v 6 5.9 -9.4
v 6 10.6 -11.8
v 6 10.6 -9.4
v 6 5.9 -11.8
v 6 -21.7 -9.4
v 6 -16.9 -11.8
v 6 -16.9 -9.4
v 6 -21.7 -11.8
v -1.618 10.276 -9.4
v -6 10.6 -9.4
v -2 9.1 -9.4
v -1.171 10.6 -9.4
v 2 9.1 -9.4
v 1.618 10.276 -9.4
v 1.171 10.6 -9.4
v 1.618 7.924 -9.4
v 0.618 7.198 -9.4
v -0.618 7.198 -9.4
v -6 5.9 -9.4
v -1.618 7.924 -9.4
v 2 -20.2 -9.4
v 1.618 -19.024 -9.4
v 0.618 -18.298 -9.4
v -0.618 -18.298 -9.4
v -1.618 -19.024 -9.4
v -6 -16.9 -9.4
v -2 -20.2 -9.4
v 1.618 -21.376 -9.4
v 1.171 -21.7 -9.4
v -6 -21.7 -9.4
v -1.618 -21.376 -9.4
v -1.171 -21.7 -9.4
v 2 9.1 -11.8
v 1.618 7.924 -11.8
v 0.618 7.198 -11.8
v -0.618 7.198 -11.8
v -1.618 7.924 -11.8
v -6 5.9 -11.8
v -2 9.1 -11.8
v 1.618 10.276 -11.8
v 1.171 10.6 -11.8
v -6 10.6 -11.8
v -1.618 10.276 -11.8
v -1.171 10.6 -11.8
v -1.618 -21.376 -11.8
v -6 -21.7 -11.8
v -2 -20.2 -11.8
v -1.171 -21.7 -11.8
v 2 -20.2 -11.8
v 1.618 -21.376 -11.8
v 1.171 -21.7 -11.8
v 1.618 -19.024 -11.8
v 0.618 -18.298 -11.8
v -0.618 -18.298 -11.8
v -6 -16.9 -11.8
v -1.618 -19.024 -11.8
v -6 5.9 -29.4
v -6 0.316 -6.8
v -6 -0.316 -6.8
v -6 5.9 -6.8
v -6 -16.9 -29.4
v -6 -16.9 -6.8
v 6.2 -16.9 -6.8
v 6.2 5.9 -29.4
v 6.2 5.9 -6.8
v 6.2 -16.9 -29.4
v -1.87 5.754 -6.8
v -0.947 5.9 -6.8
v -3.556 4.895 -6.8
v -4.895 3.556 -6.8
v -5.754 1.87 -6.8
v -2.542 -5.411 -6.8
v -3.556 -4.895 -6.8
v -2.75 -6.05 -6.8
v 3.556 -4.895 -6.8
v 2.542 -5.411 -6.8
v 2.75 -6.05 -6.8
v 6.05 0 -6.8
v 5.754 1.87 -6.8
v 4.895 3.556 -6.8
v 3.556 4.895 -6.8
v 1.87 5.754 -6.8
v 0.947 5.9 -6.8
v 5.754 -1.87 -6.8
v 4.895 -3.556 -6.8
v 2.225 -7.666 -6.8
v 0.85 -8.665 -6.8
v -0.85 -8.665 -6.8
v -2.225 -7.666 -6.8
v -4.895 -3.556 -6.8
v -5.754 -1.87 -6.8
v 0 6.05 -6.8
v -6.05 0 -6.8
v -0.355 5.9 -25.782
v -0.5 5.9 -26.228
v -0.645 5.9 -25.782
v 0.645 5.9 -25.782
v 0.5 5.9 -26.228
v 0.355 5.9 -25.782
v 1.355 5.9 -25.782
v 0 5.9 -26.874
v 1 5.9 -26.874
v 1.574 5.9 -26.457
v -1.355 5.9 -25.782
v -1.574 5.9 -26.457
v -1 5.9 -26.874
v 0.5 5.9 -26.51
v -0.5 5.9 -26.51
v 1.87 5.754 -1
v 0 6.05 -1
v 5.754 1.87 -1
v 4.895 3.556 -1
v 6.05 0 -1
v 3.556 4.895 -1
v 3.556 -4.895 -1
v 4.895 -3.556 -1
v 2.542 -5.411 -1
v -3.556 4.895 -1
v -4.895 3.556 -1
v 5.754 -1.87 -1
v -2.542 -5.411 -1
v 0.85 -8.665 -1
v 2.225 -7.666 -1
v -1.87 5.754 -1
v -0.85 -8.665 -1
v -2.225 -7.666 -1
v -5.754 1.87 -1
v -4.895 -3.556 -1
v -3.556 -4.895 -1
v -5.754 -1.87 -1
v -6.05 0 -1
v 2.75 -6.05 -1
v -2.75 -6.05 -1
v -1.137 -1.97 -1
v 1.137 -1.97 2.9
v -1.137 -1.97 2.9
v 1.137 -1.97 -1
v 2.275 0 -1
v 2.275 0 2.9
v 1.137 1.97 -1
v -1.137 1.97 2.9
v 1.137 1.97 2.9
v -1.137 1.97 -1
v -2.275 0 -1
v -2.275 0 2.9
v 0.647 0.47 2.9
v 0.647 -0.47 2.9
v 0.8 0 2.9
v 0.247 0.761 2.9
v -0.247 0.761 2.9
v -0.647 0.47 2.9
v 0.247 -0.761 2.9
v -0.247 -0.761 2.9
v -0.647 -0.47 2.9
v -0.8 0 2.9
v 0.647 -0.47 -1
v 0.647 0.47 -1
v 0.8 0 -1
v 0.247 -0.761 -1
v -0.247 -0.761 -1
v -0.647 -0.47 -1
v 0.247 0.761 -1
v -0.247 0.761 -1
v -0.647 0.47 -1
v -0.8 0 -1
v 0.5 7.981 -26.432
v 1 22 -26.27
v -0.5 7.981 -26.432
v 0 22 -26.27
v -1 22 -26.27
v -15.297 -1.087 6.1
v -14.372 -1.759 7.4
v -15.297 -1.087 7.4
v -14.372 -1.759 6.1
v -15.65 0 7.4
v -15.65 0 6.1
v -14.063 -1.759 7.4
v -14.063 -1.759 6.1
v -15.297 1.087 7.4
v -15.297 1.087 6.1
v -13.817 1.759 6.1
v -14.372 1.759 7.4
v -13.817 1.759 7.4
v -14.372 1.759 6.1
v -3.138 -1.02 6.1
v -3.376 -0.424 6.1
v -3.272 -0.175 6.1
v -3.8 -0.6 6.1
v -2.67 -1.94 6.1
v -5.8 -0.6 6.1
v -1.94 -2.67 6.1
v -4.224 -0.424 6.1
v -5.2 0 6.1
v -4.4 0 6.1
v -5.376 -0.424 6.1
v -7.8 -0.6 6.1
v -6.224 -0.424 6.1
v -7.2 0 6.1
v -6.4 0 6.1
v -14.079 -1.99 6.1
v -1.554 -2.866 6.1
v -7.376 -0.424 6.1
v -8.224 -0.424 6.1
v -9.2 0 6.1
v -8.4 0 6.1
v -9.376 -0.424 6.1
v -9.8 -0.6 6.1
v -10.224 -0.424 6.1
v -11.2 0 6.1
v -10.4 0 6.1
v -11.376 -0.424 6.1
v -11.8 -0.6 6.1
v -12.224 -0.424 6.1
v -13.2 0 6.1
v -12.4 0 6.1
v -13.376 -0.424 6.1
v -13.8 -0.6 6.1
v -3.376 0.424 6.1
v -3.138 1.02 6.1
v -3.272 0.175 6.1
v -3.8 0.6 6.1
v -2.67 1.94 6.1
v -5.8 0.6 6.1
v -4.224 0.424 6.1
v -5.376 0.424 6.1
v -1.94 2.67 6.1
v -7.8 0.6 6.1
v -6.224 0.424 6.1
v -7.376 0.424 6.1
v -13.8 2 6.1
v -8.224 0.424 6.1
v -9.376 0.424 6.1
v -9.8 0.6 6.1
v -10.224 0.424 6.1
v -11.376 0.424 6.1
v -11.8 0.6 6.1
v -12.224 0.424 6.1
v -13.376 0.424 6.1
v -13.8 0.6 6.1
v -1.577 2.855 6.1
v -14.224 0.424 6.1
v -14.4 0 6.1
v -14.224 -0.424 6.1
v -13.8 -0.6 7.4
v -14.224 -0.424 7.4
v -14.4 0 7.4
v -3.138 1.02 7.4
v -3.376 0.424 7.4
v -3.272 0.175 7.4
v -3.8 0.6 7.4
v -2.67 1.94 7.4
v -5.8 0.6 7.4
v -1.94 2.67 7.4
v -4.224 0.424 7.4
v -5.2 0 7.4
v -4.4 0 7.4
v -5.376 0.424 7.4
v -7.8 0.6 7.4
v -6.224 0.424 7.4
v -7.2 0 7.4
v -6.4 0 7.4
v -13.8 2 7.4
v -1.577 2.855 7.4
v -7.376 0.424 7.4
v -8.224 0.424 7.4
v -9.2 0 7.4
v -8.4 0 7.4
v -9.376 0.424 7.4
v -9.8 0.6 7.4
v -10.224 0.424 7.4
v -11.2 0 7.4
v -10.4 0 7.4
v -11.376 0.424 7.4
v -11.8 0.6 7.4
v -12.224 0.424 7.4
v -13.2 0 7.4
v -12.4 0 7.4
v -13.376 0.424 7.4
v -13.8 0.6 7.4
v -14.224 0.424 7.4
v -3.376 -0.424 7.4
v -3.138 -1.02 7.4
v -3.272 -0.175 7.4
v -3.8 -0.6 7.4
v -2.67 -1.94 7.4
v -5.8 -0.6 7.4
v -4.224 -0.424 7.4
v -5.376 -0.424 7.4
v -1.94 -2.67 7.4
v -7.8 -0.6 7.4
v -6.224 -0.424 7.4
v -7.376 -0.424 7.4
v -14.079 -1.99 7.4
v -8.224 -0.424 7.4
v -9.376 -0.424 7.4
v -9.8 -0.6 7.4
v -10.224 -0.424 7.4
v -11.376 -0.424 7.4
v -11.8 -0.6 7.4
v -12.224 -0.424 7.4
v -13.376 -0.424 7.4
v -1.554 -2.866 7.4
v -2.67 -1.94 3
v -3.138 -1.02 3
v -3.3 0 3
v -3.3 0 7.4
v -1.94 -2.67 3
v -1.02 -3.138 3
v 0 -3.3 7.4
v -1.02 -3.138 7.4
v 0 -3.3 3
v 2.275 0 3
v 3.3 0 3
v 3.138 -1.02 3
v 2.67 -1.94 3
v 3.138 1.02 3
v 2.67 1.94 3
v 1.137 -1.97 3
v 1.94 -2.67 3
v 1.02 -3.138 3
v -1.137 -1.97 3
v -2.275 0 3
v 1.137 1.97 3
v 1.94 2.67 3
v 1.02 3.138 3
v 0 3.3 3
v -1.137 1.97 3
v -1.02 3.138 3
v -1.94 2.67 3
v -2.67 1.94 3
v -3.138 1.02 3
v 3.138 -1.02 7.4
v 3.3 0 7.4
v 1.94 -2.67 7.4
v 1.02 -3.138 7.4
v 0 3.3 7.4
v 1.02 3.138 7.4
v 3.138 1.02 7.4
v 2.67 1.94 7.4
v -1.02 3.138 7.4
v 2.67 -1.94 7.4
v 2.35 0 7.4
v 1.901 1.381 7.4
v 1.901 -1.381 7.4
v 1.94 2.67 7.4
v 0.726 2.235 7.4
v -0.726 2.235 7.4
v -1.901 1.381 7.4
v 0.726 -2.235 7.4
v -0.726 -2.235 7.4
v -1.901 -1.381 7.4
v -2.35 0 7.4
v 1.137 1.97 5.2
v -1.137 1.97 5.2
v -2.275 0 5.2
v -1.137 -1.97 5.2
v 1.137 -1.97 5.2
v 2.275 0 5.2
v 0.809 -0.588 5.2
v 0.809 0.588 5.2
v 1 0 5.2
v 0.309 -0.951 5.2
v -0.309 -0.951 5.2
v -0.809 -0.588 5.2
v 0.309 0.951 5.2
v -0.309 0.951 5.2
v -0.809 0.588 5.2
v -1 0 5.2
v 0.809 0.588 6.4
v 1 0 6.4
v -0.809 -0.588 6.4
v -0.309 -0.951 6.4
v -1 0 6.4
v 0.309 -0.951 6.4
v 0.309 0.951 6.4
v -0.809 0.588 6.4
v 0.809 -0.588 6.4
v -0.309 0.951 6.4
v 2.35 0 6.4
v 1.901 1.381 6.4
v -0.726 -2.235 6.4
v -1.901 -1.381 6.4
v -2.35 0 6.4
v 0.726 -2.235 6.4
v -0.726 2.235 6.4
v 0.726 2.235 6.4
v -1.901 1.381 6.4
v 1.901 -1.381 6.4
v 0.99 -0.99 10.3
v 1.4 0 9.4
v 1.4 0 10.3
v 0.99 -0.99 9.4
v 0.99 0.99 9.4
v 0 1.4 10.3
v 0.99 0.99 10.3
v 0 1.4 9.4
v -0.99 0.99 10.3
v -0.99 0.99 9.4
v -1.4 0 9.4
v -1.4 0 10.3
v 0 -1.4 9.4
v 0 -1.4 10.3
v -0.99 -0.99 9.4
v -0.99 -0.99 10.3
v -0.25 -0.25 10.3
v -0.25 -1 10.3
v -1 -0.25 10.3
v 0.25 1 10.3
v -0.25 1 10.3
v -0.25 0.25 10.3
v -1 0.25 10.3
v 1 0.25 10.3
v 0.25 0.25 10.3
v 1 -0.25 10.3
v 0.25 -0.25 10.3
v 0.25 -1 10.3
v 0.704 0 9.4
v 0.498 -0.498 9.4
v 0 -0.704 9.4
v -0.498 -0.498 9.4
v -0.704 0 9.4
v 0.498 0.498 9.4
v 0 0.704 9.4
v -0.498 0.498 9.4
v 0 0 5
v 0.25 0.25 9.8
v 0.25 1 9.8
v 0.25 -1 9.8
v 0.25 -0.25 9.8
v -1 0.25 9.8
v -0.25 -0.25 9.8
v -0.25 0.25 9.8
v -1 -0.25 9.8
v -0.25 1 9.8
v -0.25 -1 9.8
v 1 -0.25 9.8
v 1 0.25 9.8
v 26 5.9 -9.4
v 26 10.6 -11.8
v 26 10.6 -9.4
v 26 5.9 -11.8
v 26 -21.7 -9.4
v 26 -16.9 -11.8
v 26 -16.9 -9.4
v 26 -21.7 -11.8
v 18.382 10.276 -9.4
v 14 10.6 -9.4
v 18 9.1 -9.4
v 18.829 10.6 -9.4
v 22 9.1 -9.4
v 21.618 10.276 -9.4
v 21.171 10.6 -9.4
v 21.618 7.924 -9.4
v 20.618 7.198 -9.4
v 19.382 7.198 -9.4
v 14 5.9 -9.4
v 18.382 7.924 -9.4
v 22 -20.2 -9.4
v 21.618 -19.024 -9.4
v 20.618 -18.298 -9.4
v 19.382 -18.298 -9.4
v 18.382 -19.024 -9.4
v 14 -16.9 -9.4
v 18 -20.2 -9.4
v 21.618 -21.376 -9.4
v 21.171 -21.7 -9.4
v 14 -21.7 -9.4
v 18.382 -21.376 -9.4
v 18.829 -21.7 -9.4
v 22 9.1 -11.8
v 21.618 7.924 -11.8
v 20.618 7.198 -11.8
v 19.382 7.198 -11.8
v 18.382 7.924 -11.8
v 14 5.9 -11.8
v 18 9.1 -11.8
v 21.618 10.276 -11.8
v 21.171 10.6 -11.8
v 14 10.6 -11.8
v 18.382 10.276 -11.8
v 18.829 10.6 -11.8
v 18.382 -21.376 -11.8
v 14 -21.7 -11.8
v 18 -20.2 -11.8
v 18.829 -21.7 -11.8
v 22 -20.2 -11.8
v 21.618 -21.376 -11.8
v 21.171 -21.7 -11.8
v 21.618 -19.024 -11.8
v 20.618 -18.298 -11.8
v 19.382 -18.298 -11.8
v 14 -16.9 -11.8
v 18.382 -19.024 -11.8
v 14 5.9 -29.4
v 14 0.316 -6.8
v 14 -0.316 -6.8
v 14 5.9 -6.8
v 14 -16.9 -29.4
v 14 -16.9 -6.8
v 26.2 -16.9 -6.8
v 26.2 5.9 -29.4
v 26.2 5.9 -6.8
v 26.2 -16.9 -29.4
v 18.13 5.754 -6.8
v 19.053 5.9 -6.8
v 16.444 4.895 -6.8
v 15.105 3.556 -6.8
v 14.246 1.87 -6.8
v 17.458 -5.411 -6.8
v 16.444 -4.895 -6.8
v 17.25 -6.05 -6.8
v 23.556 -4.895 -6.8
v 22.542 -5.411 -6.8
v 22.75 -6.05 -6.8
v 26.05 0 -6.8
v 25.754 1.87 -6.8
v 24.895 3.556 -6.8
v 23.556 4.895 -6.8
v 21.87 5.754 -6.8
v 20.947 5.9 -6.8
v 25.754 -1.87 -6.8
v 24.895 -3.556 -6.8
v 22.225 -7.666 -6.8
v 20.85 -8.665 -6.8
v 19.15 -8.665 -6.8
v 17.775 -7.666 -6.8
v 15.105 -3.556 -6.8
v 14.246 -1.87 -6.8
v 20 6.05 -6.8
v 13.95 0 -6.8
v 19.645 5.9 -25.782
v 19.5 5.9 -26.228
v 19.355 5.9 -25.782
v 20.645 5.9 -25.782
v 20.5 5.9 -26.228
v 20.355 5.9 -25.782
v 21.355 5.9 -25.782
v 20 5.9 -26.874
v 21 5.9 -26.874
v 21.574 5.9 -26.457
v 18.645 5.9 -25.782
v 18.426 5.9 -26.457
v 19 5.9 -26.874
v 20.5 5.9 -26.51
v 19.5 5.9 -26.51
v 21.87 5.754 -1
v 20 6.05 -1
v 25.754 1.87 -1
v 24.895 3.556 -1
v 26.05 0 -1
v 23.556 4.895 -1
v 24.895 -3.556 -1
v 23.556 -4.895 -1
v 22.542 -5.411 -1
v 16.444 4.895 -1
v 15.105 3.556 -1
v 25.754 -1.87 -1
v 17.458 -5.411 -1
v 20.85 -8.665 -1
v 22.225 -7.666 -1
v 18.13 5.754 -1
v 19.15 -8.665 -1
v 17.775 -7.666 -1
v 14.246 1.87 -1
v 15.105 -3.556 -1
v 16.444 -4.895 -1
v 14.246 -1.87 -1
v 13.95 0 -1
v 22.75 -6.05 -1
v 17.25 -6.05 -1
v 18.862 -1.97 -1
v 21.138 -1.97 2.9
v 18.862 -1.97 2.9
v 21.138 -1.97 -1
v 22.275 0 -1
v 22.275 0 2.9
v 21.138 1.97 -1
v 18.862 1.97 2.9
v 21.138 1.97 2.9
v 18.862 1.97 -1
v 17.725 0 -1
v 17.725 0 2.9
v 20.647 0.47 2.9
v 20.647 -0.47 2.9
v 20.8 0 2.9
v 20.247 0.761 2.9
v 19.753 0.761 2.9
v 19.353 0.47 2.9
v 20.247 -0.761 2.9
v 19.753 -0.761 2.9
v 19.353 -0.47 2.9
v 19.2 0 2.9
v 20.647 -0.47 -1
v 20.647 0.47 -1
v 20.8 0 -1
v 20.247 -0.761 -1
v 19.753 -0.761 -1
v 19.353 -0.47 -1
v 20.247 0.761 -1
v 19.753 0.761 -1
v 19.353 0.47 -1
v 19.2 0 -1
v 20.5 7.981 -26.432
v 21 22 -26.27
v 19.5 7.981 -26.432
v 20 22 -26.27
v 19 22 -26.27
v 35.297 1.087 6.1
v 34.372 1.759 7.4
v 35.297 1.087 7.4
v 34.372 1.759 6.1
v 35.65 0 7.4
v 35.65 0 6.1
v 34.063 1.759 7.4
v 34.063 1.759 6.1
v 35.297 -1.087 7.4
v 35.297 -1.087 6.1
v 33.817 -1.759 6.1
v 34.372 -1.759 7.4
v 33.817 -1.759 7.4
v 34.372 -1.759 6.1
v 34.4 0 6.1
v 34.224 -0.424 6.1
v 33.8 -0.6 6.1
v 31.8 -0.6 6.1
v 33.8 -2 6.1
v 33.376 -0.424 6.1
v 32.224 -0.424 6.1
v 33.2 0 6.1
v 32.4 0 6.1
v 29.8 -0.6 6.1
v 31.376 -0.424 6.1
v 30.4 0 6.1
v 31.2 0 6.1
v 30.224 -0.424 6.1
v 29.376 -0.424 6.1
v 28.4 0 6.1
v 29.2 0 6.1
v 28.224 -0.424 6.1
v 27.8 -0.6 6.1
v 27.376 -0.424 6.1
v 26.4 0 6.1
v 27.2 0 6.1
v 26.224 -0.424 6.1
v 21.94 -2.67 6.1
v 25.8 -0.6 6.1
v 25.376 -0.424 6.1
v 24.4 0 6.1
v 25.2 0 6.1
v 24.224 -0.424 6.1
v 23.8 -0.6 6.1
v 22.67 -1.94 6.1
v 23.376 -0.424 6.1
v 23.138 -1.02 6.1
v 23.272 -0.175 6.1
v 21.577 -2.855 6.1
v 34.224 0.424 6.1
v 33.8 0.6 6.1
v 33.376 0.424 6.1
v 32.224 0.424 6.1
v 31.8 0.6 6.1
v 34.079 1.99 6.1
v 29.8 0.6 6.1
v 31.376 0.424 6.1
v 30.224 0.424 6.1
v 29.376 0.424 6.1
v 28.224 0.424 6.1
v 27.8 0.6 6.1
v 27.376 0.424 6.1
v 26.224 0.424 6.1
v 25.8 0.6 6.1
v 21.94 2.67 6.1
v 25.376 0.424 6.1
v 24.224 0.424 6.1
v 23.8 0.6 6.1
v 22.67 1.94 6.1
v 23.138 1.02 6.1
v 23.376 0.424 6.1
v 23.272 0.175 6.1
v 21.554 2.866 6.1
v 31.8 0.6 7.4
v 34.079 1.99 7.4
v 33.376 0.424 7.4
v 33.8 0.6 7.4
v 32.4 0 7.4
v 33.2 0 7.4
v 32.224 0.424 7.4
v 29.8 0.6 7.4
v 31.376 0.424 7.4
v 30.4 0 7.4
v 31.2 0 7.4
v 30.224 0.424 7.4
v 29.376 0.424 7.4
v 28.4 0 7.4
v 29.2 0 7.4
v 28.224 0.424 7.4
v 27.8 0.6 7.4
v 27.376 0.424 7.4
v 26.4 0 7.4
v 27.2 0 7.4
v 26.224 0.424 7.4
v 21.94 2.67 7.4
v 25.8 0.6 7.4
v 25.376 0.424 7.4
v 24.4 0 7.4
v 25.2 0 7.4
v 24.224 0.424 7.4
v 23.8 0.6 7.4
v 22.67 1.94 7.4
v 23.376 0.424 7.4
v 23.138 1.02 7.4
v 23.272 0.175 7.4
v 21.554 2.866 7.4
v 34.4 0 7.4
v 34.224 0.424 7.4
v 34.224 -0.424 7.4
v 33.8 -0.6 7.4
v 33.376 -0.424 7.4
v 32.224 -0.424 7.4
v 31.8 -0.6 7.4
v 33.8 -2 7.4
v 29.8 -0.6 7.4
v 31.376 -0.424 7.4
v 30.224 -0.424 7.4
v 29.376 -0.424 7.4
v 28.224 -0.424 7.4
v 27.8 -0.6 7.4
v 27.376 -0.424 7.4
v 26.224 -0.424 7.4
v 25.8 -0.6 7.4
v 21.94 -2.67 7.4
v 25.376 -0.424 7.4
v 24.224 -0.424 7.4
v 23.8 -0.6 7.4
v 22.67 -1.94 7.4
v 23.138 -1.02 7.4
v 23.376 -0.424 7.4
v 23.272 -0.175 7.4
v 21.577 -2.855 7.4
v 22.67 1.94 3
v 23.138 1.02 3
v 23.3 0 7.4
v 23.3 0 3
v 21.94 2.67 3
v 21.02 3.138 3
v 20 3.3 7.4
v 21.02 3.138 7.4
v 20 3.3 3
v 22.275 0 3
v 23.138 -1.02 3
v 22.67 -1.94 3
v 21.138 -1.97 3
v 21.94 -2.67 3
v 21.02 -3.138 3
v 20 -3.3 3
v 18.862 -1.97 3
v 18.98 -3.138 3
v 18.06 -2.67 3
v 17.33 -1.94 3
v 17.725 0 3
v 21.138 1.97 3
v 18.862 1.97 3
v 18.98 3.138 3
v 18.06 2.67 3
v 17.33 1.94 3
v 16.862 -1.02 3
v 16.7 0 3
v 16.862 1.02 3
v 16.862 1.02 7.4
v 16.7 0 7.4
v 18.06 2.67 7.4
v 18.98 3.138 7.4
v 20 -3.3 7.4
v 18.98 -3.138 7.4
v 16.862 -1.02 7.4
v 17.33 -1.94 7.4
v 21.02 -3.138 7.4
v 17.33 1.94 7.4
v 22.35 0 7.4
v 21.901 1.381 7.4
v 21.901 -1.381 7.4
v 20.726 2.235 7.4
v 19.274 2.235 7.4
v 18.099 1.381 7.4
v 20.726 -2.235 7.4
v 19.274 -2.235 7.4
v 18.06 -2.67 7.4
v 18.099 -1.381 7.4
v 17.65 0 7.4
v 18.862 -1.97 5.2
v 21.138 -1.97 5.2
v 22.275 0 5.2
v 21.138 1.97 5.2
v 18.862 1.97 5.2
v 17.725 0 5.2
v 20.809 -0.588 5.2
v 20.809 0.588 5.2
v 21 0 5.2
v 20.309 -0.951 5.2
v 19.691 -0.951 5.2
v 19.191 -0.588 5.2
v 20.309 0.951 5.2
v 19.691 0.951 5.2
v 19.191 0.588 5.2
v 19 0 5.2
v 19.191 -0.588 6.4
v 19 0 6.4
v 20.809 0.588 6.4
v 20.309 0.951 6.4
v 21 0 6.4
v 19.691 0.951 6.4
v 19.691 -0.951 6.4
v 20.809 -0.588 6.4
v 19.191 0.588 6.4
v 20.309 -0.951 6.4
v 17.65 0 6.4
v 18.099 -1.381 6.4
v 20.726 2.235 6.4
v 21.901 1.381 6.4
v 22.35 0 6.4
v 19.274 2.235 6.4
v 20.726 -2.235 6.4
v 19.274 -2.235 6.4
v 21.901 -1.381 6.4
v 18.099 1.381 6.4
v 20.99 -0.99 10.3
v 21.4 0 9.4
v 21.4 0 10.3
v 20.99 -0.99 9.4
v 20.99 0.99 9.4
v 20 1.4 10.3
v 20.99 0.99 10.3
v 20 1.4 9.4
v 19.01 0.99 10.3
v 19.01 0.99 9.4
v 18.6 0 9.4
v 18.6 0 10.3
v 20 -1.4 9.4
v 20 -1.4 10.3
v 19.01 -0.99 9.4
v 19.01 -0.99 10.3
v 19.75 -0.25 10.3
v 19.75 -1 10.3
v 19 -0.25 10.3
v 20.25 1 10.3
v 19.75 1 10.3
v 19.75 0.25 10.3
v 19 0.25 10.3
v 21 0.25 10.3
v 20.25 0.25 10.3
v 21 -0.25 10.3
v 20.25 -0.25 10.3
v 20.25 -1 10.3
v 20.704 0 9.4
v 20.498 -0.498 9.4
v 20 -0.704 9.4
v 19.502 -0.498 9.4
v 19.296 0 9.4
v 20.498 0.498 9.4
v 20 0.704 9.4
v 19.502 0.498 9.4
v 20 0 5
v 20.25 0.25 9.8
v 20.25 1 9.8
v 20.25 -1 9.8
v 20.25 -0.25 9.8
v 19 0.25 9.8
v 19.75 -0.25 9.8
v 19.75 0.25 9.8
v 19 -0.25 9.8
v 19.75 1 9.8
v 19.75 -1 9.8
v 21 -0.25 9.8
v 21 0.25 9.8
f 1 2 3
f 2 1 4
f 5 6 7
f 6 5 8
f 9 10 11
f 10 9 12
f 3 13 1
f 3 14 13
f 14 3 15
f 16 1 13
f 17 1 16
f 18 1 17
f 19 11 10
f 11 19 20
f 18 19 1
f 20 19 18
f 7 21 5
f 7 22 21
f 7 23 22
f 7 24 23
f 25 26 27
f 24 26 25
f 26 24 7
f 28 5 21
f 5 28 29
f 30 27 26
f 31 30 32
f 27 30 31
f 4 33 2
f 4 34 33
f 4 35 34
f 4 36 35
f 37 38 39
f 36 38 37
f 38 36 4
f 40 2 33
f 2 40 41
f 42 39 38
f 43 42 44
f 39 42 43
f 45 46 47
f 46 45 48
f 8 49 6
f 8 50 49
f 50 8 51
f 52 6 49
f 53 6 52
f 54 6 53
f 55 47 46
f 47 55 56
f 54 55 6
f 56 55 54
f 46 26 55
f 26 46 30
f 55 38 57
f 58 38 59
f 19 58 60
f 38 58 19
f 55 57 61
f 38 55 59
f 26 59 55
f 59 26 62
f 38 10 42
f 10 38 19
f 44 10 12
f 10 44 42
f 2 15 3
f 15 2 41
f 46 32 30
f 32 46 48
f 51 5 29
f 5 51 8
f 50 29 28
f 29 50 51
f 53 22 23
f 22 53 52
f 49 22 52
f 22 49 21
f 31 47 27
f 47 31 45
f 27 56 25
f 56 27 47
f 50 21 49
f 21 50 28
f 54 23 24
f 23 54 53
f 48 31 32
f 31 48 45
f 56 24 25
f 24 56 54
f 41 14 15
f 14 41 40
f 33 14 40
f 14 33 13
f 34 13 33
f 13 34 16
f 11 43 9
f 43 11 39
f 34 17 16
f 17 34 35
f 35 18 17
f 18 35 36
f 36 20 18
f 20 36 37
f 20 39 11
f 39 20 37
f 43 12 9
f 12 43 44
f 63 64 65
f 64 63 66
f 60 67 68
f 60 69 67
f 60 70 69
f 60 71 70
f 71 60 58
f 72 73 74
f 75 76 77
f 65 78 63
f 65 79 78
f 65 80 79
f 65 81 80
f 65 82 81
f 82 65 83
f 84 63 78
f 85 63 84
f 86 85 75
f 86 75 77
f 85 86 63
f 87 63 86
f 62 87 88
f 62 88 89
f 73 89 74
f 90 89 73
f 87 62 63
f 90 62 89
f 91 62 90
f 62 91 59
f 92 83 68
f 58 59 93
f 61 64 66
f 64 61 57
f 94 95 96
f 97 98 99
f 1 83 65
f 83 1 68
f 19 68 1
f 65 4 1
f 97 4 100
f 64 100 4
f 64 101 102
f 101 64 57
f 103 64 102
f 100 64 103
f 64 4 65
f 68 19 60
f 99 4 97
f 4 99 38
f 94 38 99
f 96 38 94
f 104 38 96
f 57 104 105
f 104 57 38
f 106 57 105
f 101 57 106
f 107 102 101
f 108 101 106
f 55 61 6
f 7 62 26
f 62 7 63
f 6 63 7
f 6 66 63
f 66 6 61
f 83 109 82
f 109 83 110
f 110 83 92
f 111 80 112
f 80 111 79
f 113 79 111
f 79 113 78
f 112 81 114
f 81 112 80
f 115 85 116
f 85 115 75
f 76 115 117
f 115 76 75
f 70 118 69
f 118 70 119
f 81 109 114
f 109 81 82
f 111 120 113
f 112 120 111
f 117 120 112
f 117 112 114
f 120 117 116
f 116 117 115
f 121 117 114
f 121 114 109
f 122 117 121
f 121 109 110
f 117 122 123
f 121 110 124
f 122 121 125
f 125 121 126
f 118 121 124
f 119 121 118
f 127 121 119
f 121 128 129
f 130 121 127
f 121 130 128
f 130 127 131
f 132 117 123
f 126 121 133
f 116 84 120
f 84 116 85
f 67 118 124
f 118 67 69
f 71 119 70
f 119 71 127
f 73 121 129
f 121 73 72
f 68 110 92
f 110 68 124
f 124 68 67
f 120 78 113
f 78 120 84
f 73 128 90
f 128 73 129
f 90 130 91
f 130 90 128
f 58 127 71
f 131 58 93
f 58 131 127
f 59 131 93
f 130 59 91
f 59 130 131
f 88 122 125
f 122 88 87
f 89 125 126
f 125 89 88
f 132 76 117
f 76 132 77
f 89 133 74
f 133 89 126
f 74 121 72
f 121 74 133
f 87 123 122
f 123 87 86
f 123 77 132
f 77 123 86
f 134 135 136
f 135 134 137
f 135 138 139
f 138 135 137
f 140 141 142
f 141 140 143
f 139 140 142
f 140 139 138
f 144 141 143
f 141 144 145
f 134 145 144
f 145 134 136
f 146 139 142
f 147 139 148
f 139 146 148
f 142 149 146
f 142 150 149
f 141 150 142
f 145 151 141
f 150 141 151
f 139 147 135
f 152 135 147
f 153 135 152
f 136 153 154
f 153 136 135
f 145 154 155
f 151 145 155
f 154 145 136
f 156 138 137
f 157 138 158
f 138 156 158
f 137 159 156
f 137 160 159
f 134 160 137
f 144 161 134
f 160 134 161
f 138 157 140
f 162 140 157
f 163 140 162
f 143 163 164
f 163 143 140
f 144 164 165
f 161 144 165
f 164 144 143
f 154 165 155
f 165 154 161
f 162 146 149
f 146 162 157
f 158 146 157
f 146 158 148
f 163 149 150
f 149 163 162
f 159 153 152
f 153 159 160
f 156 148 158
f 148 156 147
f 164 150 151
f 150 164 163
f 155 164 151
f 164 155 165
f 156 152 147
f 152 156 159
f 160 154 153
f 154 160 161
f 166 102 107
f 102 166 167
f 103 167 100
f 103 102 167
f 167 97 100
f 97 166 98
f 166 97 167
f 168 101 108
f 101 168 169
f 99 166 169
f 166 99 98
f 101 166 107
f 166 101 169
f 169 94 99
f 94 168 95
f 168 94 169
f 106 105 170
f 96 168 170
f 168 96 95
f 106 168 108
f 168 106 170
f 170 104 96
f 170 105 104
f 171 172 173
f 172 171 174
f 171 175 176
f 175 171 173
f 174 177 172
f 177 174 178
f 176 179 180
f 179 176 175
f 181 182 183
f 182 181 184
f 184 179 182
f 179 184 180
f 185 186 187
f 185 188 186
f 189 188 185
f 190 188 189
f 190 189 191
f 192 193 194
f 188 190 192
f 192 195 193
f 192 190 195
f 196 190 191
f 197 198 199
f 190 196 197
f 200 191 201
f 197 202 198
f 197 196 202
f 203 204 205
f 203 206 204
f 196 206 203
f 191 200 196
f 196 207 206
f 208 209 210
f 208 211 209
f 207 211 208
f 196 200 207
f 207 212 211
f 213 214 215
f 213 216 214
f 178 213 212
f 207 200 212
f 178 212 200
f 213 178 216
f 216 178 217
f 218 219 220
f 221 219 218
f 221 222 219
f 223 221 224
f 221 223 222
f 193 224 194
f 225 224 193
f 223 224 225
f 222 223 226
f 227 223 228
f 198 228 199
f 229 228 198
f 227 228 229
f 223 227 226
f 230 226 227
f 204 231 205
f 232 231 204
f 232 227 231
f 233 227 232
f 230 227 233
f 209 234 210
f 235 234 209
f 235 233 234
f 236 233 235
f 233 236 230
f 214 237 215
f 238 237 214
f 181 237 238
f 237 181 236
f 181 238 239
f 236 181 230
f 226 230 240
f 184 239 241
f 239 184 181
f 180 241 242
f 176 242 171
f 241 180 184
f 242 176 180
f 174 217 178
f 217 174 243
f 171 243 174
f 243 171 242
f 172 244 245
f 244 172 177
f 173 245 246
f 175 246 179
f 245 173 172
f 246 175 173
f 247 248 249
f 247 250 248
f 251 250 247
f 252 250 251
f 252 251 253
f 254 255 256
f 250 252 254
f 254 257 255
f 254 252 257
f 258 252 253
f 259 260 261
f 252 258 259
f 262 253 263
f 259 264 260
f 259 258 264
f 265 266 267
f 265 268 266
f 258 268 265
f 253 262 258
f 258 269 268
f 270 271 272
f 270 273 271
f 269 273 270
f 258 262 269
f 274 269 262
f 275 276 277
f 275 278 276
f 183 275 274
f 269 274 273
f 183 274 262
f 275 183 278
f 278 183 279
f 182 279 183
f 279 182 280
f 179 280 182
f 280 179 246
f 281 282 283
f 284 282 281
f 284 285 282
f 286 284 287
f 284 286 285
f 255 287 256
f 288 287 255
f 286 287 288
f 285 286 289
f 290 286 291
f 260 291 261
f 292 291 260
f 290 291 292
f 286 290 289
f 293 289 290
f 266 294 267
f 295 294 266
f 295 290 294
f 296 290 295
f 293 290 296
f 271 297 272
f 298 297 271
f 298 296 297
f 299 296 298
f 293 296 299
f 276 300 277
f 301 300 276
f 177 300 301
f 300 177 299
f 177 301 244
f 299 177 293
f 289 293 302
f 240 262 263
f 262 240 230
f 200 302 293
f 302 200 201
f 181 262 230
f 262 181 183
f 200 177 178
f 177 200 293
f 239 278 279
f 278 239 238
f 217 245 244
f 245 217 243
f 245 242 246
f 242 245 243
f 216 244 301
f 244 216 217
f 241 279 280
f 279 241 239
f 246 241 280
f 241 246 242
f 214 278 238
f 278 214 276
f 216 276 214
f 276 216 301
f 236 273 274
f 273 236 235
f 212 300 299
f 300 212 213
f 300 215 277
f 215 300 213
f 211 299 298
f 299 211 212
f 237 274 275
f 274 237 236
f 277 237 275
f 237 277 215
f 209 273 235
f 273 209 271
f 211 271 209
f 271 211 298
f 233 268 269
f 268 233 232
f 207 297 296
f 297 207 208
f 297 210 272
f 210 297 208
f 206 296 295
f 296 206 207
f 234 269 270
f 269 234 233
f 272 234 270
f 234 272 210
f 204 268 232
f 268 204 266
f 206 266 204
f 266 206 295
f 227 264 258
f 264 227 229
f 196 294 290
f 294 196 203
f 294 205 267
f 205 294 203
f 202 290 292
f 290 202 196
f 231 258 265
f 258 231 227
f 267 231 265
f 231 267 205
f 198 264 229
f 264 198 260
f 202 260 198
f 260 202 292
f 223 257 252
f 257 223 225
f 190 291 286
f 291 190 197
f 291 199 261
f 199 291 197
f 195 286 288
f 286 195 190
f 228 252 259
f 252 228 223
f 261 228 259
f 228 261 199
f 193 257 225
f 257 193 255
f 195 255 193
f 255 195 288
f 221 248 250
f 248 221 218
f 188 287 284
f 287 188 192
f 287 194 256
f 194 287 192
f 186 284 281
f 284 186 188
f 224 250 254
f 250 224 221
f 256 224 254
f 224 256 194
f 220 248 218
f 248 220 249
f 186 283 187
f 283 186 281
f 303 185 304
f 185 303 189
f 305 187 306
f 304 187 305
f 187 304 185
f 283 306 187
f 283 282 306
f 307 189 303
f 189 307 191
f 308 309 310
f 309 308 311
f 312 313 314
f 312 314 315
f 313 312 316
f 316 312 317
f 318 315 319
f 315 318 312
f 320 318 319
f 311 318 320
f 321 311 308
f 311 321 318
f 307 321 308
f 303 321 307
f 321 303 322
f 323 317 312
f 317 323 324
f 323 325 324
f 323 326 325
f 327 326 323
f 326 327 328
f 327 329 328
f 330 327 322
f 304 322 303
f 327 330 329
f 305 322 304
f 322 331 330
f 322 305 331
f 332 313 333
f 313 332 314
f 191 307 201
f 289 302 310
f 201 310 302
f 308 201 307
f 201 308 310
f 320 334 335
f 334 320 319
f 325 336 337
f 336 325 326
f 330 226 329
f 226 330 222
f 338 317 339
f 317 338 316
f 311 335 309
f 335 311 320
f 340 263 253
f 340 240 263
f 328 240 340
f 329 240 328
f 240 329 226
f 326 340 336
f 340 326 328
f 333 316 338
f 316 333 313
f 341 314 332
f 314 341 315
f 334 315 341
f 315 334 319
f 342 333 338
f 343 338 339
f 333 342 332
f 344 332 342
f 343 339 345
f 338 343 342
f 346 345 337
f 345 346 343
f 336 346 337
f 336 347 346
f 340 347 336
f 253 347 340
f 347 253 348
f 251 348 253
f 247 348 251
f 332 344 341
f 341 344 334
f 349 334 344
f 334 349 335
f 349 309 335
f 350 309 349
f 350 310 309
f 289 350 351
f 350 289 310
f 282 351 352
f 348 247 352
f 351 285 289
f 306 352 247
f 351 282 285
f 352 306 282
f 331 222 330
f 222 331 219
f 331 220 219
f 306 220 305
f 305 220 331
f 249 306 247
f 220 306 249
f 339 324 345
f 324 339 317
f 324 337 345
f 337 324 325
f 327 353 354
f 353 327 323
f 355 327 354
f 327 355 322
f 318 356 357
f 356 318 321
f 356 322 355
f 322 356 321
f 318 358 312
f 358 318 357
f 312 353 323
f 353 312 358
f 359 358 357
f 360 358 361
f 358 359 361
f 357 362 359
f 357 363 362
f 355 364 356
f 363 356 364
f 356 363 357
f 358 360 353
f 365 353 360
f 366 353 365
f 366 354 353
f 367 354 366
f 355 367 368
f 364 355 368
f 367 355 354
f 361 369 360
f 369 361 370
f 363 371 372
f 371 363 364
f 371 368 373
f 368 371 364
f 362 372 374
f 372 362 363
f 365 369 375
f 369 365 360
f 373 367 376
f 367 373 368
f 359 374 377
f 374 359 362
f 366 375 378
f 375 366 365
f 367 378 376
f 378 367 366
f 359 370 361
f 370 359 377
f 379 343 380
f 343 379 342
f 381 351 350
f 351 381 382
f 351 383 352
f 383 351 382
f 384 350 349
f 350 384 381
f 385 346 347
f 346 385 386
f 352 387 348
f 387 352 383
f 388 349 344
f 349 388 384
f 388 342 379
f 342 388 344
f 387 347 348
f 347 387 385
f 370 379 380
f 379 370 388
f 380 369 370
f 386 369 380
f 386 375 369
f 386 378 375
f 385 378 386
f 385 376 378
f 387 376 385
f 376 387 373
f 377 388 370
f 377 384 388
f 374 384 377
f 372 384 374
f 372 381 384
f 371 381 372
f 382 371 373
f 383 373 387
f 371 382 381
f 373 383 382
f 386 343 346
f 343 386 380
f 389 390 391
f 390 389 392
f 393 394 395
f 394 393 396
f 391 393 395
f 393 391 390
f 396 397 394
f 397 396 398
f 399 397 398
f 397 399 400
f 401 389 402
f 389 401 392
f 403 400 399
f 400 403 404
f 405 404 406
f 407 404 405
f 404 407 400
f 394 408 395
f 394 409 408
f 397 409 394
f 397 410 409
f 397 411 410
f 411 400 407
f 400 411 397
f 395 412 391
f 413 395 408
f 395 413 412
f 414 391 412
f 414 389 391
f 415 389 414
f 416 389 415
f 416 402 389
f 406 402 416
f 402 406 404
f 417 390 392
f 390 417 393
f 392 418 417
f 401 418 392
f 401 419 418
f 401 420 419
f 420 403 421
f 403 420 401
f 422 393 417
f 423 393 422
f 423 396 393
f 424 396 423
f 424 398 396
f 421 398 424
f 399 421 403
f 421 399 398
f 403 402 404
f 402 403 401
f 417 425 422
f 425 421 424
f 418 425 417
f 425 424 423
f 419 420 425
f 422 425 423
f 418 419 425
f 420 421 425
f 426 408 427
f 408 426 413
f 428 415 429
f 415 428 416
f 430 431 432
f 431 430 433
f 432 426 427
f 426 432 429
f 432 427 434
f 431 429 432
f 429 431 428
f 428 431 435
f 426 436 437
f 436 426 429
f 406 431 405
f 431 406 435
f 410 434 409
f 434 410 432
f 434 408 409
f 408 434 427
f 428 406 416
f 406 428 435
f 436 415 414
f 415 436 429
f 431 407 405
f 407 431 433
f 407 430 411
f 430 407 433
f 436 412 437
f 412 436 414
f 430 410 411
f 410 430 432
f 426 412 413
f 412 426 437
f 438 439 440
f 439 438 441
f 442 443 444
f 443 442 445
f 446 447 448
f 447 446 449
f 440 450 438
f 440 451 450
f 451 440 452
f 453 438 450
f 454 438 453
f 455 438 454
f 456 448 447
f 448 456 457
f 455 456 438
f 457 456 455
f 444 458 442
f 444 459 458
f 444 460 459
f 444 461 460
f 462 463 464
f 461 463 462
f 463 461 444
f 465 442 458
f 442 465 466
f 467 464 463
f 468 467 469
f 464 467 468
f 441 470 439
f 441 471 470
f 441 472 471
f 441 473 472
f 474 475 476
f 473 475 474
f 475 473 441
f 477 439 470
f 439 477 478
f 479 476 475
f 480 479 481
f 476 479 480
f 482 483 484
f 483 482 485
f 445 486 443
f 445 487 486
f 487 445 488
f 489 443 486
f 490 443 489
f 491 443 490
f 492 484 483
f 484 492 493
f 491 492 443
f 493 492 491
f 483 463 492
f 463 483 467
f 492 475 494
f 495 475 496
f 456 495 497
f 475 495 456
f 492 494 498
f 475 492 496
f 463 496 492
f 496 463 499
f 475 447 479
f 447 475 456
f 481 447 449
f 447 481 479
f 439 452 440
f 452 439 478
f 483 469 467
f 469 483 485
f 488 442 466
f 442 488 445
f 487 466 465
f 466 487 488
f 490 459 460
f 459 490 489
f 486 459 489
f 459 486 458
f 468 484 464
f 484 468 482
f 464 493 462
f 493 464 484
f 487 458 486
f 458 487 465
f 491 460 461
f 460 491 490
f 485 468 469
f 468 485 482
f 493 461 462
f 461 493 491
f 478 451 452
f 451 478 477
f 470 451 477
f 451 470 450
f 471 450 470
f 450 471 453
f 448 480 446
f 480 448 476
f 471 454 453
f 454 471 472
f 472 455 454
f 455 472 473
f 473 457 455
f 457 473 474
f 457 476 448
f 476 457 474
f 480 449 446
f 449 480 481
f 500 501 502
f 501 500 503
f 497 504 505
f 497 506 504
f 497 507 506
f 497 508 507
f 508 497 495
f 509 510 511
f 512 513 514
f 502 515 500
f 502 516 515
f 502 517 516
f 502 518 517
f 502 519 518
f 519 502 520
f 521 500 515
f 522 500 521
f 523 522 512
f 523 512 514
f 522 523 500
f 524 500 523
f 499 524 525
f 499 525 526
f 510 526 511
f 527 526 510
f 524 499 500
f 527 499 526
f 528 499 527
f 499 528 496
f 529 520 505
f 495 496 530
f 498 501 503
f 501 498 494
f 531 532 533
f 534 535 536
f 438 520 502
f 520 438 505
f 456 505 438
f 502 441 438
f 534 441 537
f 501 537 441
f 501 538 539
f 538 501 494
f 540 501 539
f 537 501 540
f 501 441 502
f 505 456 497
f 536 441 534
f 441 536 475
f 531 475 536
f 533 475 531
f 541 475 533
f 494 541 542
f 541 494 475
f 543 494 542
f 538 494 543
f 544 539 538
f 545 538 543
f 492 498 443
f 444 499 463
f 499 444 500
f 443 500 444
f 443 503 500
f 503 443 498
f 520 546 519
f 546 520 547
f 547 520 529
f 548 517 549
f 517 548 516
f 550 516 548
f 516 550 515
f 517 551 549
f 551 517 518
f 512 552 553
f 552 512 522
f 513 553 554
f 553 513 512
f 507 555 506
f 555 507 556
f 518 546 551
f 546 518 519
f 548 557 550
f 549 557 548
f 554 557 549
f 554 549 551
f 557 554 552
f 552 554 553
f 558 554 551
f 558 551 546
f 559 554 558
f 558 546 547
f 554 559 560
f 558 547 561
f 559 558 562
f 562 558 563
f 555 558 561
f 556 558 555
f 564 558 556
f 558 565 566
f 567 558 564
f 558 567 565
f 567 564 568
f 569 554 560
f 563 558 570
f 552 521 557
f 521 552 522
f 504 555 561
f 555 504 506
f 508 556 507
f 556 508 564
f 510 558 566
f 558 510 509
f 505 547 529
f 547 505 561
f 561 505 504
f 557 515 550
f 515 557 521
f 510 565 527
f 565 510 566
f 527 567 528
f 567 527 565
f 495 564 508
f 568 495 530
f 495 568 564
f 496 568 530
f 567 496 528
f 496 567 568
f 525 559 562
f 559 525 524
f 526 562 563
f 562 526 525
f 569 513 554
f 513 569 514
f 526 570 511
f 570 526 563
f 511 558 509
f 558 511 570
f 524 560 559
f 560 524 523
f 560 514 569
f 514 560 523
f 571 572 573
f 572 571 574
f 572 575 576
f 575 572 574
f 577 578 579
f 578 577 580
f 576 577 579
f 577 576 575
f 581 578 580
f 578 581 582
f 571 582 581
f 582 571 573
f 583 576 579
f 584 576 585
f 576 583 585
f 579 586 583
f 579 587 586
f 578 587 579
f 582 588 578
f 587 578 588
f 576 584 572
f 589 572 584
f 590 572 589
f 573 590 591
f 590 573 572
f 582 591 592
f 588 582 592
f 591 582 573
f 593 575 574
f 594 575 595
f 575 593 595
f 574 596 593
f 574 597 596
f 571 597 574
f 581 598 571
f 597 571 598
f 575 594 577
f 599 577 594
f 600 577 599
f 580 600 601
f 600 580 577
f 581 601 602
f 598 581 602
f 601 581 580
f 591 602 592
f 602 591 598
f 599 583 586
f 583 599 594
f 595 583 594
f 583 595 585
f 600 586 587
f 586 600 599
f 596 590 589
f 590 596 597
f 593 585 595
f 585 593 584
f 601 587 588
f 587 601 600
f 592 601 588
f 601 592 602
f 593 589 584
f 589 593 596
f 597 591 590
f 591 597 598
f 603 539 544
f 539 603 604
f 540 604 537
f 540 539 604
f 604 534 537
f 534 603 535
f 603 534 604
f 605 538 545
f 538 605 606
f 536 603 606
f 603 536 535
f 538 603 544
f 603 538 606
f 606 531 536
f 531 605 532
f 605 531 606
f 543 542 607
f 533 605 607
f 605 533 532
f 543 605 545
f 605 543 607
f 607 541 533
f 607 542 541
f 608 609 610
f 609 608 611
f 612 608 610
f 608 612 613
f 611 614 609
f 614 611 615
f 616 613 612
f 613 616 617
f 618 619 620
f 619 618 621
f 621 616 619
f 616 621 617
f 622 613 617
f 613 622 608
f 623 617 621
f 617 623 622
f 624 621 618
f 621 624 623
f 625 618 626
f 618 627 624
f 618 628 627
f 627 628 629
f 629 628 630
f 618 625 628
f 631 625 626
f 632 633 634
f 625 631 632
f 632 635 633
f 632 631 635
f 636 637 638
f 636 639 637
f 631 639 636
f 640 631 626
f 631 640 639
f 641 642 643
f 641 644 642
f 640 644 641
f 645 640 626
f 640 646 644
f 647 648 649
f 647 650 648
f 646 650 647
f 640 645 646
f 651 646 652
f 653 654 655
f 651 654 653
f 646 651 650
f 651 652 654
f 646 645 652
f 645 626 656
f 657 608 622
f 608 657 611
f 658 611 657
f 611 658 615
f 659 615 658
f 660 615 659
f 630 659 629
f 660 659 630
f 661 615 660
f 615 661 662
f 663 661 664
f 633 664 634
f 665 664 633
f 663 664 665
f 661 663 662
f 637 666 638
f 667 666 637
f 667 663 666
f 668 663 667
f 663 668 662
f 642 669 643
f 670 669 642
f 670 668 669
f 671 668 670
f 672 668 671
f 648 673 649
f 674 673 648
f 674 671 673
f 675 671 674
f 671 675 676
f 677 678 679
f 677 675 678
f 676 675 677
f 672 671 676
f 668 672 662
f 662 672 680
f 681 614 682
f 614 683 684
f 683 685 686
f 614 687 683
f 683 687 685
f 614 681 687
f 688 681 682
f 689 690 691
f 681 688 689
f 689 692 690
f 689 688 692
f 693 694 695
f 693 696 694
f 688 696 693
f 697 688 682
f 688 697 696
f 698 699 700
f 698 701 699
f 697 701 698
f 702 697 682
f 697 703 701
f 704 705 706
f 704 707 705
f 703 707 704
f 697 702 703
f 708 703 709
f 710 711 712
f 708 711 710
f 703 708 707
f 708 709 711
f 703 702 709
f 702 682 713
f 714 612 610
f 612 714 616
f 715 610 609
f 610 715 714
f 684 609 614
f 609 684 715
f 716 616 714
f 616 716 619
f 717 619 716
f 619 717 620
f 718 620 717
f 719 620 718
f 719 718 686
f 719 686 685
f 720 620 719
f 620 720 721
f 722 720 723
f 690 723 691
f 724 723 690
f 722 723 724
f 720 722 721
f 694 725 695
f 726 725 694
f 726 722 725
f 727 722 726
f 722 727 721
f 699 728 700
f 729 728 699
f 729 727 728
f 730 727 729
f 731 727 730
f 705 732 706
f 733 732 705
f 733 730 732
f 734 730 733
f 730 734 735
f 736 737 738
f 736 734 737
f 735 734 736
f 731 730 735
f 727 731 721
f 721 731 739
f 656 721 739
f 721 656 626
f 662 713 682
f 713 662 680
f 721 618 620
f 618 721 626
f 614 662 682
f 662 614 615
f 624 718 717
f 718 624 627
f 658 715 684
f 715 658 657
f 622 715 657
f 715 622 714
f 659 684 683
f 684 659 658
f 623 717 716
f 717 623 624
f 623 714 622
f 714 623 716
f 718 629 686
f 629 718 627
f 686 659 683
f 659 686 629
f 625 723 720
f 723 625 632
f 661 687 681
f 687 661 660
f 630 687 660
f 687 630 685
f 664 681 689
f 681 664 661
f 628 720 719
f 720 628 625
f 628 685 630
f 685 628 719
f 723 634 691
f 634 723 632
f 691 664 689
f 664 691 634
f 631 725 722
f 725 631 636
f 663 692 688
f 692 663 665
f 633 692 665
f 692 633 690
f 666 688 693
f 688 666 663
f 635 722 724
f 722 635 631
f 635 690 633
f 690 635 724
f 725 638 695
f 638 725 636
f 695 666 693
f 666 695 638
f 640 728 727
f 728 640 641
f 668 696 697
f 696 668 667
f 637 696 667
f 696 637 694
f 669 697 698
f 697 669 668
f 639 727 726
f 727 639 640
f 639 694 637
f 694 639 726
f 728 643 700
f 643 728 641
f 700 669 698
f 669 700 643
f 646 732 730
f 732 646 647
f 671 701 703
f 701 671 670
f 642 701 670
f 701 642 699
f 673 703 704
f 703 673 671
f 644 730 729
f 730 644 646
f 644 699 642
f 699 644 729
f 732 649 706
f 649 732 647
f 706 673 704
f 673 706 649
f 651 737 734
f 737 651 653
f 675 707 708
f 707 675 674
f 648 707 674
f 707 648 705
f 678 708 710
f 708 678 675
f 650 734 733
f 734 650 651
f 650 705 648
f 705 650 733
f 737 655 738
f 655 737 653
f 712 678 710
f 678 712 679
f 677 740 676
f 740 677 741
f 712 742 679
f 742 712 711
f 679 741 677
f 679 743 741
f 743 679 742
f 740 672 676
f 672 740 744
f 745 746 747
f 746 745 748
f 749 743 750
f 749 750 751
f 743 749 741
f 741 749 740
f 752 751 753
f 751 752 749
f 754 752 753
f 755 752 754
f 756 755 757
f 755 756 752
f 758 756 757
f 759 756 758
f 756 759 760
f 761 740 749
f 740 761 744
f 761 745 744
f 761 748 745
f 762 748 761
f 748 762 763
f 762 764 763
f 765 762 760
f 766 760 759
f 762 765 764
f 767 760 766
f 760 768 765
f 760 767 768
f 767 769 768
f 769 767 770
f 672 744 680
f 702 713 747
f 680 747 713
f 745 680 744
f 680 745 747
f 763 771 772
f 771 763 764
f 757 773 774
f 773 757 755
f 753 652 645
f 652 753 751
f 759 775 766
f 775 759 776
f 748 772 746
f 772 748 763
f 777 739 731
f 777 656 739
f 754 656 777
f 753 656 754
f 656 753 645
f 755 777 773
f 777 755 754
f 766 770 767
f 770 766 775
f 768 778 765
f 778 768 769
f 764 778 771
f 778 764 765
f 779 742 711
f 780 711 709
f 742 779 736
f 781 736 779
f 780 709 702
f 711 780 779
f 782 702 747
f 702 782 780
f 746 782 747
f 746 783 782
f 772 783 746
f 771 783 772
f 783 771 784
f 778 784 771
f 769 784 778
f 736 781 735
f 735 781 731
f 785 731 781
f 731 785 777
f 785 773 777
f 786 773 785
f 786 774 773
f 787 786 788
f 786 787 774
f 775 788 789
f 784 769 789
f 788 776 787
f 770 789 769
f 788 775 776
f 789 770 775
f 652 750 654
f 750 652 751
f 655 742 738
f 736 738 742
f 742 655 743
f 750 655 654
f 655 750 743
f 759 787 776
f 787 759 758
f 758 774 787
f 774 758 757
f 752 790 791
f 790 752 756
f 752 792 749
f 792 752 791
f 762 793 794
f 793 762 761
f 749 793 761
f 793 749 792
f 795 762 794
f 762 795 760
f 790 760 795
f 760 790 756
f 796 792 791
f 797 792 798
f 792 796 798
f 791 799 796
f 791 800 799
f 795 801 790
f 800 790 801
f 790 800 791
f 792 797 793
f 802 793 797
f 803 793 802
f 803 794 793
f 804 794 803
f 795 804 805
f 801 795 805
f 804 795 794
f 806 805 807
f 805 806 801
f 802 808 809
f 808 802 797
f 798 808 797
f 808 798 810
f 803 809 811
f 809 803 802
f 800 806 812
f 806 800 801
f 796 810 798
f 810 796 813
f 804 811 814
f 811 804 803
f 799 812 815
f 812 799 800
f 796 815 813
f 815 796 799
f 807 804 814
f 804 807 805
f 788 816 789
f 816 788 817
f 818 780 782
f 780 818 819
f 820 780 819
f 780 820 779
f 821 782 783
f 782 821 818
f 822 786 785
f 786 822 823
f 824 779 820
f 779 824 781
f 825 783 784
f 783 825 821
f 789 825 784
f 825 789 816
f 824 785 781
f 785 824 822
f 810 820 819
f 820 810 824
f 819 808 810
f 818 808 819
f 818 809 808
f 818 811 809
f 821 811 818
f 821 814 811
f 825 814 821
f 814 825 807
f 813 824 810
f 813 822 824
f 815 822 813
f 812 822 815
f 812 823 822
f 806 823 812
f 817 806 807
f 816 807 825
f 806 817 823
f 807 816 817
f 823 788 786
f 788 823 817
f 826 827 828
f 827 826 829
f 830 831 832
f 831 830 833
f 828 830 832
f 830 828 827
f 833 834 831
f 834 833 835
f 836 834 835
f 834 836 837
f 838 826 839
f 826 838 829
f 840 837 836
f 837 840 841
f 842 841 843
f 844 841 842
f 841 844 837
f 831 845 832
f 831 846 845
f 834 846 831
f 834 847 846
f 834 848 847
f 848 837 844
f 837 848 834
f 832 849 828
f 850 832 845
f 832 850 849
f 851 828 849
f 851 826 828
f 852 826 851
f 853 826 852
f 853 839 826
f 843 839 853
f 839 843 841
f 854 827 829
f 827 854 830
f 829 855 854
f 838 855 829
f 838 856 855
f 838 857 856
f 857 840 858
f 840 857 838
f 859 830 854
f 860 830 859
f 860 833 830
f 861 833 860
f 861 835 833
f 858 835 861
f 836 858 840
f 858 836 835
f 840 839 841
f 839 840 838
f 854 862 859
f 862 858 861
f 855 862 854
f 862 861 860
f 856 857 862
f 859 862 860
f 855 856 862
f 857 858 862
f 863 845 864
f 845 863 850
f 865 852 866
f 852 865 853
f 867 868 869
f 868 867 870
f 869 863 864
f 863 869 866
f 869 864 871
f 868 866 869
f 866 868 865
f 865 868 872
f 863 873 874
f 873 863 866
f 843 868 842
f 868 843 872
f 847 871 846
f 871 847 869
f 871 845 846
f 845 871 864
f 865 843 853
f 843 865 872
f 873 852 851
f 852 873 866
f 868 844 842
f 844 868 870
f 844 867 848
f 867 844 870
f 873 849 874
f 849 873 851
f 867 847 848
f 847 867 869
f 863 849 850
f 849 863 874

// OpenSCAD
use <parts.scad>

SG90();
translate([0, 0, 3]) rotate(180) SG90_single_horn();
translate([0, 0, 6]) SG90_horn_screw();

translate([20, 0, 0]) {
    SG90();
    translate([0, 0, 3]) rotate(0) SG90_single_horn();
    translate([0, 0, 6]) SG90_horn_screw();
}
